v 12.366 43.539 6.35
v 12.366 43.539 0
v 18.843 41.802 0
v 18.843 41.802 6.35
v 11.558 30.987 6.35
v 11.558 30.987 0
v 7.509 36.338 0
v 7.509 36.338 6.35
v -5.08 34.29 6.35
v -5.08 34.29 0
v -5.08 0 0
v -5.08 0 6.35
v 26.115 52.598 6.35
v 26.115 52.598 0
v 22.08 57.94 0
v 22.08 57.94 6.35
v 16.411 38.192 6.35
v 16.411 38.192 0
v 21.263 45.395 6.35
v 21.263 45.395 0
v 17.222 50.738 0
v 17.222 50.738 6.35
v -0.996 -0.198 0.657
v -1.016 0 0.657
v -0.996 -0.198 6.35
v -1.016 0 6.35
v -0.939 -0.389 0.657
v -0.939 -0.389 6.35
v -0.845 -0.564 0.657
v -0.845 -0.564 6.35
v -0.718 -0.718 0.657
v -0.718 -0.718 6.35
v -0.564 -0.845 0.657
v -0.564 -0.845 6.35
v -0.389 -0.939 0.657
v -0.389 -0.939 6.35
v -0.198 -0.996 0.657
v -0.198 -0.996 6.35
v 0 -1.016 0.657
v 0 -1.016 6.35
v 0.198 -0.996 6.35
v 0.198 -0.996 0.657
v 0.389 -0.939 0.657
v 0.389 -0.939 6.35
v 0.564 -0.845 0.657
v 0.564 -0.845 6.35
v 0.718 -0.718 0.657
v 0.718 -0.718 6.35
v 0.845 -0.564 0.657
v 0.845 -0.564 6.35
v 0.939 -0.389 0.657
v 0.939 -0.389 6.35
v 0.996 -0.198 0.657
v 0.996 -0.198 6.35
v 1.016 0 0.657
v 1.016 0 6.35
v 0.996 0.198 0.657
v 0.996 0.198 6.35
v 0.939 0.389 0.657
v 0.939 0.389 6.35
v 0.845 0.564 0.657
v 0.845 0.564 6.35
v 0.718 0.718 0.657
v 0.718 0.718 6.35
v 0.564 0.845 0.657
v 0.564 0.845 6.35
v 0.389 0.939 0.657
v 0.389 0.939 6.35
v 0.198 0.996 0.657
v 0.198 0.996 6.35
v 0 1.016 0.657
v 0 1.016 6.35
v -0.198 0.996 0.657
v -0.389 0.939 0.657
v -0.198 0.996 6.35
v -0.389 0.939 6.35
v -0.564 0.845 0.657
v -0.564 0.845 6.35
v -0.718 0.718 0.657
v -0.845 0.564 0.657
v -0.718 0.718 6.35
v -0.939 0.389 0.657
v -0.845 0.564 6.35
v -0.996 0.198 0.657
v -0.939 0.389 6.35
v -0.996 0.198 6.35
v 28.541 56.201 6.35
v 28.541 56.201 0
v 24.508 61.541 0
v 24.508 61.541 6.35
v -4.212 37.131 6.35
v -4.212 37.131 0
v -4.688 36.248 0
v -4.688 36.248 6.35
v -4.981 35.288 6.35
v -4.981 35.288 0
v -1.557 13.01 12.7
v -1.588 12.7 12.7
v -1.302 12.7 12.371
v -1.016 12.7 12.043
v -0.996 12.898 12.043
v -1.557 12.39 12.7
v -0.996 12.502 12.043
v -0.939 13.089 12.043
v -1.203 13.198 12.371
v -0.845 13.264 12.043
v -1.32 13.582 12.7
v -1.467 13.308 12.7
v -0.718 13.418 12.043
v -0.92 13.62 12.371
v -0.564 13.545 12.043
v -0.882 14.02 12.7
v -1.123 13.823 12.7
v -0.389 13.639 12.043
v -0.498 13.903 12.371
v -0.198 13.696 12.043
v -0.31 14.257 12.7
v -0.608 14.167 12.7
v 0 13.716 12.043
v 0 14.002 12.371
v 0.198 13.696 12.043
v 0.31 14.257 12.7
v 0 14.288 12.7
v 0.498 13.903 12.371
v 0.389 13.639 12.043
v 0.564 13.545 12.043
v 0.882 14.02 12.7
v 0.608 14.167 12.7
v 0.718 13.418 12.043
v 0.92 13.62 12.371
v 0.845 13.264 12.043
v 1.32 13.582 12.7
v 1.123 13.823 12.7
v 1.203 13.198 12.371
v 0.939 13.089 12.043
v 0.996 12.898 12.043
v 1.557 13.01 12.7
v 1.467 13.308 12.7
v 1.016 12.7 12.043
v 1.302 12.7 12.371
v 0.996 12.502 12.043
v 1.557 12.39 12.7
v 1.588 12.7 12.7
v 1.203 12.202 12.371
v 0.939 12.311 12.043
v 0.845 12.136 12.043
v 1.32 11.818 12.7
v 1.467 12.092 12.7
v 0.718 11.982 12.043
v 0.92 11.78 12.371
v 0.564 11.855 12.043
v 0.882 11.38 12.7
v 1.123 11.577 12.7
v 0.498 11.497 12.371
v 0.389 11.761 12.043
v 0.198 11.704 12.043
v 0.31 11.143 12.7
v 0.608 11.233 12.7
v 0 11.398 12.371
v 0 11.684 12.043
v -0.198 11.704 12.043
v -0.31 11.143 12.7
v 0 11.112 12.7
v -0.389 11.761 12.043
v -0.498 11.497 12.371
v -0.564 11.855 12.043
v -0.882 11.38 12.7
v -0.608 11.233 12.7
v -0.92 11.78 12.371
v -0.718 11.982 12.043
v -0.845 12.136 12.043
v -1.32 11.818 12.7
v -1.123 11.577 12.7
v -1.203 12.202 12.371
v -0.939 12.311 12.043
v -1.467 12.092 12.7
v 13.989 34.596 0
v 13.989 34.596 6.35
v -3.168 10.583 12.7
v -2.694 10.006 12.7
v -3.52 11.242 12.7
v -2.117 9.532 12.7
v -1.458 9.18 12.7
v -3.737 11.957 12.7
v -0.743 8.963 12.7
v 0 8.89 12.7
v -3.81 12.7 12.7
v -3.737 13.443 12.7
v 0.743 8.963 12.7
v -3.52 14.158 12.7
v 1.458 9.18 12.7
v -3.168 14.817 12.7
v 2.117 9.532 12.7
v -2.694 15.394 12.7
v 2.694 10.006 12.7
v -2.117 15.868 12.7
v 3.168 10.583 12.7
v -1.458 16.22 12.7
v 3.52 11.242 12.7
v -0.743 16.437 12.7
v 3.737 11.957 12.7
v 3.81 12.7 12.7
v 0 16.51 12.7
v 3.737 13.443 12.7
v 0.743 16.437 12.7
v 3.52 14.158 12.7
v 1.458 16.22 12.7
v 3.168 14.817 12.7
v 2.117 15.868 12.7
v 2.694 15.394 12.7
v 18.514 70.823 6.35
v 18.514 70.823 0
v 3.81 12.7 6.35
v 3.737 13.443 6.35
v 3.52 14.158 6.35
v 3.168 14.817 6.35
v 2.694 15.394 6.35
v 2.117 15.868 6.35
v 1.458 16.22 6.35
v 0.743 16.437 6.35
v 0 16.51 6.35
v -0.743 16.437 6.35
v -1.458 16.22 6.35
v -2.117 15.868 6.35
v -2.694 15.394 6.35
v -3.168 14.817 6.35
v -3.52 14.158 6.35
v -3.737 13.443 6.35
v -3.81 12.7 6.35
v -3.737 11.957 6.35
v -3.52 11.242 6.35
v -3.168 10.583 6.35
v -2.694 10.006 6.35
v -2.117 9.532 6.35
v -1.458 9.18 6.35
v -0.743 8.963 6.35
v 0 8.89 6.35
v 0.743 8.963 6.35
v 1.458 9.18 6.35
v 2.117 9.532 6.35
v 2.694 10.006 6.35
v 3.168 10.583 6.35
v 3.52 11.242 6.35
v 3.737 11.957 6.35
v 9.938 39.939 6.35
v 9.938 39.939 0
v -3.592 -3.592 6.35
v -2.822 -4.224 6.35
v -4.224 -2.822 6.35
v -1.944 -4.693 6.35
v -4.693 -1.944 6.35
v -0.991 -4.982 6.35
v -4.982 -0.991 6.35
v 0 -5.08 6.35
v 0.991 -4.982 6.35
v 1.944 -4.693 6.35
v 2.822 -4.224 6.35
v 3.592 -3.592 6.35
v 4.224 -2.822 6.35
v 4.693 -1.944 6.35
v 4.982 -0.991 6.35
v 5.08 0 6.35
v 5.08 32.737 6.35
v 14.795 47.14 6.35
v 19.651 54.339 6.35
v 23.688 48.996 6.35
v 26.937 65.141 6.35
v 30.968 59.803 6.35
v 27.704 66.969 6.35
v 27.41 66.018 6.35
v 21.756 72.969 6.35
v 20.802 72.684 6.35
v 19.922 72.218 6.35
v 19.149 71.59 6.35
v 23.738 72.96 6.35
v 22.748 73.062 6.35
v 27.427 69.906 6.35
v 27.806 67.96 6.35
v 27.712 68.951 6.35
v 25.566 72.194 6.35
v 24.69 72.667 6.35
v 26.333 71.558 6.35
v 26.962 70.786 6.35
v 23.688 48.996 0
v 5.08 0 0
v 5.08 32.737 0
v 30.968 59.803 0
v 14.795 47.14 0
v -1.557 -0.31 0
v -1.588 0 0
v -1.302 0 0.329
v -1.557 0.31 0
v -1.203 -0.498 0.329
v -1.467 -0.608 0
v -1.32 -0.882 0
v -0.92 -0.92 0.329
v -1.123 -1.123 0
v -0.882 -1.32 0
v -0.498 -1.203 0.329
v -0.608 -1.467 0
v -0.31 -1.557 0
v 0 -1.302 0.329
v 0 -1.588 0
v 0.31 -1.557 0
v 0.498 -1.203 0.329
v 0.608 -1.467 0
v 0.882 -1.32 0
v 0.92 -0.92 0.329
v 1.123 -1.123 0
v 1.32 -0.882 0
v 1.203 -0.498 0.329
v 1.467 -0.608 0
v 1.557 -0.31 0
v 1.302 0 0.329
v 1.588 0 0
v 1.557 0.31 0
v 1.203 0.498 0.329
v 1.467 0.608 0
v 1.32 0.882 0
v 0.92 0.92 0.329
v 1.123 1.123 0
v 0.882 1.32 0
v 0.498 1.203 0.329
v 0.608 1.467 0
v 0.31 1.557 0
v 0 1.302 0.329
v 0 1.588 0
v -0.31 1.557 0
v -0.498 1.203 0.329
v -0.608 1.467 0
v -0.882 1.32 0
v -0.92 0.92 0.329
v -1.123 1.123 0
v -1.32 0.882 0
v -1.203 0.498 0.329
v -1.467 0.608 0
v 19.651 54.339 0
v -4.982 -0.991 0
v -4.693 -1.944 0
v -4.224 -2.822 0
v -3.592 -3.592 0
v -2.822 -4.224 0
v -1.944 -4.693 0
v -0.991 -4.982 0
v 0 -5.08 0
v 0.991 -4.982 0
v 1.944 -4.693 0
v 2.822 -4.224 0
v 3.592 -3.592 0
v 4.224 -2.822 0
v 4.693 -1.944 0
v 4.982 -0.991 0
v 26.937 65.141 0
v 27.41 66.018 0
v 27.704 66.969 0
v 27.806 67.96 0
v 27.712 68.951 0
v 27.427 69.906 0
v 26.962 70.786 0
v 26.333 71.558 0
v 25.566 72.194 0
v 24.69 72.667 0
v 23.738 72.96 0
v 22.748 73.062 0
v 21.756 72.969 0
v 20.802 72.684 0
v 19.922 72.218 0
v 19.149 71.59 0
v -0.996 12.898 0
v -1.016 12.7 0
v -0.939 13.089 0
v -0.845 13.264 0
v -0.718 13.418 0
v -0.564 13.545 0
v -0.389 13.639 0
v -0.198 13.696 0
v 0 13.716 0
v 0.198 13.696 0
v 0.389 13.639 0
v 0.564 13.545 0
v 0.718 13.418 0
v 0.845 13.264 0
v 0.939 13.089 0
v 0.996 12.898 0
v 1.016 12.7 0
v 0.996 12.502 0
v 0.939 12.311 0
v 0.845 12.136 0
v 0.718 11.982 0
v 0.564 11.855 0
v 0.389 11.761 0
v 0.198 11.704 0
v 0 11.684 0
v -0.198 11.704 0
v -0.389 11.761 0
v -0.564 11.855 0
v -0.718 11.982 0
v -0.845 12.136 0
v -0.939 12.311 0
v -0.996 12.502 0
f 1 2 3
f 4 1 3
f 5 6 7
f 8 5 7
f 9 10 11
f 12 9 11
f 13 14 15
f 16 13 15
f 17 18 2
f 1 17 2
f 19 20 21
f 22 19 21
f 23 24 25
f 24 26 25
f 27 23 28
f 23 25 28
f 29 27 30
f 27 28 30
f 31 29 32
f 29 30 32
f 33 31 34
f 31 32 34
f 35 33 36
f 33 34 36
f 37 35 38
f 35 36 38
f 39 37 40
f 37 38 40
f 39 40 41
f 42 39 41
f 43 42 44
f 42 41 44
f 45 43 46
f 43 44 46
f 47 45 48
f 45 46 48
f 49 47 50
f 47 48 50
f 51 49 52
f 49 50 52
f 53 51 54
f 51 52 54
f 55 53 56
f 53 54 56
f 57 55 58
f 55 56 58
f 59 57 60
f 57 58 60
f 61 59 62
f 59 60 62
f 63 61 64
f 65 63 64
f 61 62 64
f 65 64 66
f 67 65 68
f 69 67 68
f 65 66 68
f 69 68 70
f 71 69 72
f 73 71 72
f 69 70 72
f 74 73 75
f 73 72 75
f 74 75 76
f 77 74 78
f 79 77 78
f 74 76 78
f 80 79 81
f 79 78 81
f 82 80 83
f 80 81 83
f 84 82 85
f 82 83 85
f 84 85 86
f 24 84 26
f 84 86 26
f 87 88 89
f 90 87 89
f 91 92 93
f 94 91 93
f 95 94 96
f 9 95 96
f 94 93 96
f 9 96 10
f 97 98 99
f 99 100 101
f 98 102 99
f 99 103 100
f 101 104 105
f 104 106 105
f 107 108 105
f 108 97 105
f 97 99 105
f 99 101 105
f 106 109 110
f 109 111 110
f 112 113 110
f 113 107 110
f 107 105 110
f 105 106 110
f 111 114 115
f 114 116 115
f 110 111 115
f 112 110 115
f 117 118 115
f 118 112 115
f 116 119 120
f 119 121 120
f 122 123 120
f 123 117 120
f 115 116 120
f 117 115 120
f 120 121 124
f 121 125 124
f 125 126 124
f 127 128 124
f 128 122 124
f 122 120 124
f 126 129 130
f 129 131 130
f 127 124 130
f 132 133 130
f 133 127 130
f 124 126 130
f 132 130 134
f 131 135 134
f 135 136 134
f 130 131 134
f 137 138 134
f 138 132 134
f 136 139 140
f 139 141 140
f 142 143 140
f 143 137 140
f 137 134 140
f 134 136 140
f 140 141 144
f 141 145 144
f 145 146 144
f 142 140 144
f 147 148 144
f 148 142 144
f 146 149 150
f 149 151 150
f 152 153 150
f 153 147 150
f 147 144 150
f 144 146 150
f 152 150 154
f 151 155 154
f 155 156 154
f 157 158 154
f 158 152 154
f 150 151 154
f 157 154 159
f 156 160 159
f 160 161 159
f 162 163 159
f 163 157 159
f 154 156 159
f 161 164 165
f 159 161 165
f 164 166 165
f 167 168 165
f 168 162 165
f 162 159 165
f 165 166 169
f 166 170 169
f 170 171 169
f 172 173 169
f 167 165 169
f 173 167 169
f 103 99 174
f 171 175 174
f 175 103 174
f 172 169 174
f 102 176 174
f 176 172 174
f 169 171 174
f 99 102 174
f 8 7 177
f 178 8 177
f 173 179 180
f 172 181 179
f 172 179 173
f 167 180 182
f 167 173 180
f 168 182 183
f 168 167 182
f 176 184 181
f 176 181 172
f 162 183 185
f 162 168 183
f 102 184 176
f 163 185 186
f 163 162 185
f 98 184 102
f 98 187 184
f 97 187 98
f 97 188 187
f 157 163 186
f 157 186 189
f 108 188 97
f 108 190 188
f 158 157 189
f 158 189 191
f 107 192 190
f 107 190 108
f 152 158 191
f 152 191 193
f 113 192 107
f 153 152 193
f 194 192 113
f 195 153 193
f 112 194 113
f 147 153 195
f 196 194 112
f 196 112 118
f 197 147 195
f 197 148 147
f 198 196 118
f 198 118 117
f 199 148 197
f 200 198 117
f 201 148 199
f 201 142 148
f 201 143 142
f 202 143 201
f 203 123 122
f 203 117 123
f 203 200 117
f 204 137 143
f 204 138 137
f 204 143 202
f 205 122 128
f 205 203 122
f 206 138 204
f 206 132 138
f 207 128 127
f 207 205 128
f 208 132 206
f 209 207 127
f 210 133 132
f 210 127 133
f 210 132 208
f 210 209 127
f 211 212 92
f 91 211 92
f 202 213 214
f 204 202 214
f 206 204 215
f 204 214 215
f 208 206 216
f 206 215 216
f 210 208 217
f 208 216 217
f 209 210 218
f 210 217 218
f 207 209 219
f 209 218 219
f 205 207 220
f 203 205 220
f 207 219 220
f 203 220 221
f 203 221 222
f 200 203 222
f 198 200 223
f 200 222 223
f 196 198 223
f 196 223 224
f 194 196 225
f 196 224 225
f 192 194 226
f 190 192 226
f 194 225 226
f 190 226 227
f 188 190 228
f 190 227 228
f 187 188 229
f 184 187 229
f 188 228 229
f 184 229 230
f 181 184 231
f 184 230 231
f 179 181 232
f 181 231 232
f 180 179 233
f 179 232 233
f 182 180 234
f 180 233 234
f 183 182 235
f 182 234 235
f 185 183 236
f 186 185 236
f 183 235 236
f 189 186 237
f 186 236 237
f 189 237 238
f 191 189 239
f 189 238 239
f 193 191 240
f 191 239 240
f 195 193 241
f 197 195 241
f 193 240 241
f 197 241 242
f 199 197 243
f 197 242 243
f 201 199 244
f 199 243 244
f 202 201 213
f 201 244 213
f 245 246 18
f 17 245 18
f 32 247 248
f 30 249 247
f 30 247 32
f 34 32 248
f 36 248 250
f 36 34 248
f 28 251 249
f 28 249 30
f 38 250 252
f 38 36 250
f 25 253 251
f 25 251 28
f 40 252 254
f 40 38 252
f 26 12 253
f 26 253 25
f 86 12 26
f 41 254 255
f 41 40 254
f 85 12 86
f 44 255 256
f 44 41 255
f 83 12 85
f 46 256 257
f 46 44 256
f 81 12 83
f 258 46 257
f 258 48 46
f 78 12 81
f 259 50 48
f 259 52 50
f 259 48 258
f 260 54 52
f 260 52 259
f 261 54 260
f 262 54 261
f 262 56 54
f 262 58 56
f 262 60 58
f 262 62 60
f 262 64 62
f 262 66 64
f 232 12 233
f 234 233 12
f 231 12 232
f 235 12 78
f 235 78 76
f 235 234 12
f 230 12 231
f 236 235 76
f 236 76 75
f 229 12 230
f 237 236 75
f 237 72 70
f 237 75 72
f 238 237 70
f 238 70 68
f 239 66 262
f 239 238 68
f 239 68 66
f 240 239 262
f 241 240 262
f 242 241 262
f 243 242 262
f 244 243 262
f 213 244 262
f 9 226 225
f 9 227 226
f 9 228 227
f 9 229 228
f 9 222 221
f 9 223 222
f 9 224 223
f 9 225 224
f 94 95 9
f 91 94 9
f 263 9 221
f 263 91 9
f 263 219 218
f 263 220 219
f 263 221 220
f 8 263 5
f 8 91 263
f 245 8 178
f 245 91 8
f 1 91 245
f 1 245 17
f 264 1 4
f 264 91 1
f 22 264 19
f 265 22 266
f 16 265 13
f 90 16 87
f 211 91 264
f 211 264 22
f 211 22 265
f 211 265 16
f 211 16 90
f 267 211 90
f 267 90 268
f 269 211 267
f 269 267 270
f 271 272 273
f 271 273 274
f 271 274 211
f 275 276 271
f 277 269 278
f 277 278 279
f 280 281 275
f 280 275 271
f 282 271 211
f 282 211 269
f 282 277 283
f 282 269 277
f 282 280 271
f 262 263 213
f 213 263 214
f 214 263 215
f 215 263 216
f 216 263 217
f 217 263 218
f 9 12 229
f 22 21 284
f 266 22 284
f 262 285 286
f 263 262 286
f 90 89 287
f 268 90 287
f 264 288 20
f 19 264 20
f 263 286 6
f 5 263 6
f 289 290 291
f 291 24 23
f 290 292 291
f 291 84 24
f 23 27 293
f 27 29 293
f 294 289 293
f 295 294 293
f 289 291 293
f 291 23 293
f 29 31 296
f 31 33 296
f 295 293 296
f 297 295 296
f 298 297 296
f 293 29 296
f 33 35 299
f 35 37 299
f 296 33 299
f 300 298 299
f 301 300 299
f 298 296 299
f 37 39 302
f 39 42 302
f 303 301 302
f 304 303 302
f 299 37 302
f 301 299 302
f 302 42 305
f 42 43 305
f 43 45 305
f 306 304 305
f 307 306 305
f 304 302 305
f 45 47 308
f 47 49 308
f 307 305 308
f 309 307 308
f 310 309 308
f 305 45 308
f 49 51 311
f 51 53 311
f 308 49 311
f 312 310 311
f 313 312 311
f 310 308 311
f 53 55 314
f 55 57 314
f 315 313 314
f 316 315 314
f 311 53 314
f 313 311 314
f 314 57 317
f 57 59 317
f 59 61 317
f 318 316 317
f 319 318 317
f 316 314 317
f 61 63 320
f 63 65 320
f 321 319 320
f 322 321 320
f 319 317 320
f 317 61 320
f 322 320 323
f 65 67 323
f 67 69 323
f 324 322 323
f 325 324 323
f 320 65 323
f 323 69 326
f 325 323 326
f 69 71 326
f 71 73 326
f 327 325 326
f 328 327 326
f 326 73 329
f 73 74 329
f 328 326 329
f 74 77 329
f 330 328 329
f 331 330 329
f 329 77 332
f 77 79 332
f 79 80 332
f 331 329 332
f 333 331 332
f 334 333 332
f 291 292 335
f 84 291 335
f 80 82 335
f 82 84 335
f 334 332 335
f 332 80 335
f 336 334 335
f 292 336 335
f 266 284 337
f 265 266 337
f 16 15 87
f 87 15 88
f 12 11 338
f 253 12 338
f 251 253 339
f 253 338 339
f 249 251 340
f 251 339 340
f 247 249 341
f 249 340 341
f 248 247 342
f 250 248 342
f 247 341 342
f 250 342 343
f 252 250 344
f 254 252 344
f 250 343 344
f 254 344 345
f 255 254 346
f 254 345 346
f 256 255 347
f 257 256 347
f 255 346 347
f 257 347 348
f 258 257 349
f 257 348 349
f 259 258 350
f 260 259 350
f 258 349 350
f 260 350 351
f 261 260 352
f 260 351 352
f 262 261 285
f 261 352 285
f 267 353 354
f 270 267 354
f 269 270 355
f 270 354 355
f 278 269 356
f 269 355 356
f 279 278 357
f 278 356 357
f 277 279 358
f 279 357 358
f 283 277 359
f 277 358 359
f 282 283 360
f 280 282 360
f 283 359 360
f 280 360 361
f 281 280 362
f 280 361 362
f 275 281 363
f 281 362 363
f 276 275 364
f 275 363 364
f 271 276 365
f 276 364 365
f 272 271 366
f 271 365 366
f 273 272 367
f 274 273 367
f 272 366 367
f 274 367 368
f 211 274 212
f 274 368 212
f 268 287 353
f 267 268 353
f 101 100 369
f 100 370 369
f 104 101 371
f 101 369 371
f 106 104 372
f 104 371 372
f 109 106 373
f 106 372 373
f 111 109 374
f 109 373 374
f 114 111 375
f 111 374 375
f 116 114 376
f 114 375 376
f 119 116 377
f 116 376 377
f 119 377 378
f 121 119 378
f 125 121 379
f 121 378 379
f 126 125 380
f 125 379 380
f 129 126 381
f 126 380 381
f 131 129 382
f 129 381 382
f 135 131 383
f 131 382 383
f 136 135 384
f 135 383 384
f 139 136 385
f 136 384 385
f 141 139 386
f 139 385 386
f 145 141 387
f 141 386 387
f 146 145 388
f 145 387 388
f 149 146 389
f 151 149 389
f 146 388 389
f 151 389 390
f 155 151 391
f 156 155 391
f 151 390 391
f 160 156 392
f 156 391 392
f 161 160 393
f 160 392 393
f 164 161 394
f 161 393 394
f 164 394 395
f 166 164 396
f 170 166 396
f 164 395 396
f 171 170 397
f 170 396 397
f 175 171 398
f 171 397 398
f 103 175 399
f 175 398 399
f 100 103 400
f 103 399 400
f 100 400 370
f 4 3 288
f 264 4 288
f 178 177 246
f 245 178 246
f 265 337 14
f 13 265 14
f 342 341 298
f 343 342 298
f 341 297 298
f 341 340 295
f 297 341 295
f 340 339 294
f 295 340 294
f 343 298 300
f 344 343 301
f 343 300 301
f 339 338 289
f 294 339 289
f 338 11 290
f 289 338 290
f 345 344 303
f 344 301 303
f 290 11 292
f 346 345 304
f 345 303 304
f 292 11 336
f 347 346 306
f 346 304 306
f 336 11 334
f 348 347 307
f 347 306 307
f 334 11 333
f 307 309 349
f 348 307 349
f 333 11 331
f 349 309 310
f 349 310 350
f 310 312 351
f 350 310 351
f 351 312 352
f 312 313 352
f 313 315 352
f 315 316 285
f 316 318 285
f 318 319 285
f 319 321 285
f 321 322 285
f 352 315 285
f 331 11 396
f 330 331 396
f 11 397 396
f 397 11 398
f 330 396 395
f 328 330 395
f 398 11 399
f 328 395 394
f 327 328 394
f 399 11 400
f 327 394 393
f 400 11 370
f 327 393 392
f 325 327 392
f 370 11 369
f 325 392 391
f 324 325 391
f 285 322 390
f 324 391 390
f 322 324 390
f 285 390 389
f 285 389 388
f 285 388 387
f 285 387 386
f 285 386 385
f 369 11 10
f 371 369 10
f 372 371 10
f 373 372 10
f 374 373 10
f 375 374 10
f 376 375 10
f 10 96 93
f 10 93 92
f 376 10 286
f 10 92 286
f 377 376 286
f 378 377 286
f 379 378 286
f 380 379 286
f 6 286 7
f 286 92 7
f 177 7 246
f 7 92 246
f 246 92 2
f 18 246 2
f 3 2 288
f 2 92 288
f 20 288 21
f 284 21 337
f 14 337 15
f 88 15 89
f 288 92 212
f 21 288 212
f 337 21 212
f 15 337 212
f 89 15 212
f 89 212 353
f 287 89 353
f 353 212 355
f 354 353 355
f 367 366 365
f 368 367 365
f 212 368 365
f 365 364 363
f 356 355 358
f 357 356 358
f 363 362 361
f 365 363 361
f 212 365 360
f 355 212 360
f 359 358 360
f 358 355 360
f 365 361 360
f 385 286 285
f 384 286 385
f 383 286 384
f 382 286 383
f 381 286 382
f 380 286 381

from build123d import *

# Parameters (mm, degrees)
F1_DEPTH       = 6.35
F2_R           = 3.81
F3_DEPTH       = 6.35
F5_D           = 2.032
F5_CSINK_D     = 3.175
F5_CSINK_ANGLE = 82
F6_D           = 2.032
F6_CSINK_D     = 3.175
F6_CSINK_ANGLE = 82


with BuildPart() as f1:
    # F0 (on Top) → F1 (new body)
    with BuildSketch(Plane.XY):
        with BuildLine():
            ThreePointArc((-5.08, 12.7), (-3.5921024484, 9.1078975516), (0, 7.62))
            Line((0, 7.62), (0, 12.7))
            Line((0, 12.7), (0, 17.78))
            ThreePointArc((0, 17.78), (-3.5921024484, 16.2921024484), (-5.08, 12.7))
        make_face()
        with BuildLine():
            Line((0, 12.7), (0, 7.62))
            ThreePointArc((0, 7.62), (3.5921024484, 9.1078975516), (5.08, 12.7))
            ThreePointArc((5.08, 12.7), (3.5921024484, 16.2921024484), (0, 17.78))
            Line((0, 17.78), (0, 12.7))
        make_face()
        with BuildLine():
            ThreePointArc((5.08, 12.7), (3.5921024484, 9.1078975516), (0, 7.62))
            ThreePointArc((0, 7.62), (-3.5921024484, 9.1078975516), (-5.08, 12.7))
            Line((-5.08, 12.7), (-5.08, 0))
            ThreePointArc((-5.08, 0), (0, -5.08), (5.08, 0))
            Line((5.08, 0), (5.08, 12.7))
        make_face()
        with BuildLine():
            ThreePointArc((0, 17.78), (3.5921024484, 16.2921024484), (5.08, 12.7))
            Line((5.08, 12.7), (5.08, 32.7368881382))
            Line((5.08, 32.7368881382), (4.2115108686, 31.4493000504))
            ThreePointArc((4.2115108686, 31.4493000504), (2.384915539, 29.8046262283), (0, 29.21))
            Line((0, 29.21), (0, 17.78))
        make_face()
        with BuildLine():
            Line((-5.08, 34.29), (-5.08, 12.7))
            ThreePointArc((-5.08, 12.7), (-3.5921024484, 16.2921024484), (0, 17.78))
            Line((0, 17.78), (0, 29.21))
            ThreePointArc((0, 29.21), (-3.5921024484, 30.6978975516), (-5.08, 34.29))
        make_face()
        with BuildLine():
            Line((5.08, 34.29), (5.08, 32.7368881382))
            Line((5.08, 32.7368881382), (7.5087984569, 36.3377299308))
            Line((7.5087984569, 36.3377299308), (9.9375969139, 39.9385717235))
            Line((9.9375969139, 39.9385717235), (12.3663953708, 43.5394135161))
            Line((12.3663953708, 43.5394135161), (14.7951938277, 47.1402553087))
            Line((14.7951938277, 47.1402553087), (15.5743106671, 48.2953435247))
            Line((15.5743106671, 48.2953435247), (17.2219166379, 50.7380198285))
            Line((17.2219166379, 50.7380198285), (19.6507150948, 54.3388616211))
            Line((19.6507150948, 54.3388616211), (22.0795135518, 57.9397034137))
            Line((22.0795135518, 57.9397034137), (24.5083120087, 61.5405452064))
            Line((24.5083120087, 61.5405452064), (26.9371104656, 65.141386999))
            ThreePointArc((26.9371104656, 65.141386999), (25.5662995467, 72.1935978172), (18.5140887285, 70.8227868983))
            Line((18.5140887285, 70.8227868983), (-4.2115108686, 37.1306999496))
            ThreePointArc((-4.2115108686, 37.1306999496), (-0.9693096965, 39.2766660919), (2.8406999496, 38.5015108686))
            ThreePointArc((2.8406999496, 38.5015108686), (4.4853737717, 36.674915539), (5.08, 34.29))
        make_face()
        with BuildLine():
            Line((4.2115108686, 31.4493000504), (5.08, 32.7368881382))
            Line((5.08, 32.7368881382), (5.08, 34.29))
            ThreePointArc((5.08, 34.29), (4.4853737717, 36.674915539), (2.8406999496, 38.5015108686))
            Line((2.8406999496, 38.5015108686), (0, 34.29))
            Line((0, 34.29), (0, 29.21))
            ThreePointArc((0, 29.21), (2.384915539, 29.8046262283), (4.2115108686, 31.4493000504))
        make_face()
        Polygon((7.5087984569, 36.3377299308), (5.08, 32.7368881382), (11.5576660786, 30.9871907177), align=None)
        with BuildLine():
            ThreePointArc((-4.2115108686, 37.1306999496), (-4.8580281603, 35.77524826), (-5.08, 34.29))
            ThreePointArc((-5.08, 34.29), (-3.5921024484, 30.6978975516), (0, 29.21))
            Line((0, 29.21), (0, 34.29))
            Line((0, 34.29), (2.8406999496, 38.5015108686))
            ThreePointArc((2.8406999496, 38.5015108686), (-0.9693096965, 39.2766660919), (-4.2115108686, 37.1306999496))
        make_face()
        Polygon((9.9375969139, 39.9385717235), (7.5087984569, 36.3377299308), (13.9886397713, 34.5961055653), align=None)
        Polygon((12.3663953708, 43.5394135161), (9.9375969139, 39.9385717235), (16.4107760502, 38.1919007837), align=None)
        Polygon((14.7951938277, 47.1402553087), (12.3663953708, 43.5394135161), (18.842780956, 41.8023465243), align=None)
        Polygon((30.9680322355, 59.8029524158), (26.9371104656, 65.141386999), (24.5083120087, 61.5405452064), align=None)
        Polygon((15.5743106671, 48.2953435247), (14.7951938277, 47.1402553087), (21.262849157, 45.3950715667), (17.2219166379, 50.7380198285), align=None)
        Polygon((28.5414772497, 56.2005973827), (24.5083120087, 61.5405452064), (22.0795135518, 57.9397034137), align=None)
        Polygon((26.1149222639, 52.5982423497), (22.0795135518, 57.9397034137), (19.6507150948, 54.3388616211), align=None)
        Polygon((19.6507150948, 54.3388616211), (17.2219166379, 50.7380198285), (23.6883672781, 48.9958873167), align=None)
    extrude(amount=F1_DEPTH)

    # F2 (on face) → F3 (join)
    with BuildSketch(Plane.XY.offset(6.35)):
        with Locations((0, 12.7)):
            Circle(F2_R)
    extrude(amount=F3_DEPTH)

    # F5 (through all)
    with Locations(Plane.XY.offset(12.7)):
        with Locations((0, 12.7)):
            CounterSinkHole(F5_D / 2, F5_CSINK_D / 2, counter_sink_angle=F5_CSINK_ANGLE)

    # F6 (through all)
    with Locations(Plane(origin=(0, 0, 0), x_dir=(1, 0, 0), z_dir=(0, 0, -1))):
        with Locations((0, 0)):
            CounterSinkHole(F6_D / 2, F6_CSINK_D / 2, counter_sink_angle=F6_CSINK_ANGLE)


solid = f1.part
